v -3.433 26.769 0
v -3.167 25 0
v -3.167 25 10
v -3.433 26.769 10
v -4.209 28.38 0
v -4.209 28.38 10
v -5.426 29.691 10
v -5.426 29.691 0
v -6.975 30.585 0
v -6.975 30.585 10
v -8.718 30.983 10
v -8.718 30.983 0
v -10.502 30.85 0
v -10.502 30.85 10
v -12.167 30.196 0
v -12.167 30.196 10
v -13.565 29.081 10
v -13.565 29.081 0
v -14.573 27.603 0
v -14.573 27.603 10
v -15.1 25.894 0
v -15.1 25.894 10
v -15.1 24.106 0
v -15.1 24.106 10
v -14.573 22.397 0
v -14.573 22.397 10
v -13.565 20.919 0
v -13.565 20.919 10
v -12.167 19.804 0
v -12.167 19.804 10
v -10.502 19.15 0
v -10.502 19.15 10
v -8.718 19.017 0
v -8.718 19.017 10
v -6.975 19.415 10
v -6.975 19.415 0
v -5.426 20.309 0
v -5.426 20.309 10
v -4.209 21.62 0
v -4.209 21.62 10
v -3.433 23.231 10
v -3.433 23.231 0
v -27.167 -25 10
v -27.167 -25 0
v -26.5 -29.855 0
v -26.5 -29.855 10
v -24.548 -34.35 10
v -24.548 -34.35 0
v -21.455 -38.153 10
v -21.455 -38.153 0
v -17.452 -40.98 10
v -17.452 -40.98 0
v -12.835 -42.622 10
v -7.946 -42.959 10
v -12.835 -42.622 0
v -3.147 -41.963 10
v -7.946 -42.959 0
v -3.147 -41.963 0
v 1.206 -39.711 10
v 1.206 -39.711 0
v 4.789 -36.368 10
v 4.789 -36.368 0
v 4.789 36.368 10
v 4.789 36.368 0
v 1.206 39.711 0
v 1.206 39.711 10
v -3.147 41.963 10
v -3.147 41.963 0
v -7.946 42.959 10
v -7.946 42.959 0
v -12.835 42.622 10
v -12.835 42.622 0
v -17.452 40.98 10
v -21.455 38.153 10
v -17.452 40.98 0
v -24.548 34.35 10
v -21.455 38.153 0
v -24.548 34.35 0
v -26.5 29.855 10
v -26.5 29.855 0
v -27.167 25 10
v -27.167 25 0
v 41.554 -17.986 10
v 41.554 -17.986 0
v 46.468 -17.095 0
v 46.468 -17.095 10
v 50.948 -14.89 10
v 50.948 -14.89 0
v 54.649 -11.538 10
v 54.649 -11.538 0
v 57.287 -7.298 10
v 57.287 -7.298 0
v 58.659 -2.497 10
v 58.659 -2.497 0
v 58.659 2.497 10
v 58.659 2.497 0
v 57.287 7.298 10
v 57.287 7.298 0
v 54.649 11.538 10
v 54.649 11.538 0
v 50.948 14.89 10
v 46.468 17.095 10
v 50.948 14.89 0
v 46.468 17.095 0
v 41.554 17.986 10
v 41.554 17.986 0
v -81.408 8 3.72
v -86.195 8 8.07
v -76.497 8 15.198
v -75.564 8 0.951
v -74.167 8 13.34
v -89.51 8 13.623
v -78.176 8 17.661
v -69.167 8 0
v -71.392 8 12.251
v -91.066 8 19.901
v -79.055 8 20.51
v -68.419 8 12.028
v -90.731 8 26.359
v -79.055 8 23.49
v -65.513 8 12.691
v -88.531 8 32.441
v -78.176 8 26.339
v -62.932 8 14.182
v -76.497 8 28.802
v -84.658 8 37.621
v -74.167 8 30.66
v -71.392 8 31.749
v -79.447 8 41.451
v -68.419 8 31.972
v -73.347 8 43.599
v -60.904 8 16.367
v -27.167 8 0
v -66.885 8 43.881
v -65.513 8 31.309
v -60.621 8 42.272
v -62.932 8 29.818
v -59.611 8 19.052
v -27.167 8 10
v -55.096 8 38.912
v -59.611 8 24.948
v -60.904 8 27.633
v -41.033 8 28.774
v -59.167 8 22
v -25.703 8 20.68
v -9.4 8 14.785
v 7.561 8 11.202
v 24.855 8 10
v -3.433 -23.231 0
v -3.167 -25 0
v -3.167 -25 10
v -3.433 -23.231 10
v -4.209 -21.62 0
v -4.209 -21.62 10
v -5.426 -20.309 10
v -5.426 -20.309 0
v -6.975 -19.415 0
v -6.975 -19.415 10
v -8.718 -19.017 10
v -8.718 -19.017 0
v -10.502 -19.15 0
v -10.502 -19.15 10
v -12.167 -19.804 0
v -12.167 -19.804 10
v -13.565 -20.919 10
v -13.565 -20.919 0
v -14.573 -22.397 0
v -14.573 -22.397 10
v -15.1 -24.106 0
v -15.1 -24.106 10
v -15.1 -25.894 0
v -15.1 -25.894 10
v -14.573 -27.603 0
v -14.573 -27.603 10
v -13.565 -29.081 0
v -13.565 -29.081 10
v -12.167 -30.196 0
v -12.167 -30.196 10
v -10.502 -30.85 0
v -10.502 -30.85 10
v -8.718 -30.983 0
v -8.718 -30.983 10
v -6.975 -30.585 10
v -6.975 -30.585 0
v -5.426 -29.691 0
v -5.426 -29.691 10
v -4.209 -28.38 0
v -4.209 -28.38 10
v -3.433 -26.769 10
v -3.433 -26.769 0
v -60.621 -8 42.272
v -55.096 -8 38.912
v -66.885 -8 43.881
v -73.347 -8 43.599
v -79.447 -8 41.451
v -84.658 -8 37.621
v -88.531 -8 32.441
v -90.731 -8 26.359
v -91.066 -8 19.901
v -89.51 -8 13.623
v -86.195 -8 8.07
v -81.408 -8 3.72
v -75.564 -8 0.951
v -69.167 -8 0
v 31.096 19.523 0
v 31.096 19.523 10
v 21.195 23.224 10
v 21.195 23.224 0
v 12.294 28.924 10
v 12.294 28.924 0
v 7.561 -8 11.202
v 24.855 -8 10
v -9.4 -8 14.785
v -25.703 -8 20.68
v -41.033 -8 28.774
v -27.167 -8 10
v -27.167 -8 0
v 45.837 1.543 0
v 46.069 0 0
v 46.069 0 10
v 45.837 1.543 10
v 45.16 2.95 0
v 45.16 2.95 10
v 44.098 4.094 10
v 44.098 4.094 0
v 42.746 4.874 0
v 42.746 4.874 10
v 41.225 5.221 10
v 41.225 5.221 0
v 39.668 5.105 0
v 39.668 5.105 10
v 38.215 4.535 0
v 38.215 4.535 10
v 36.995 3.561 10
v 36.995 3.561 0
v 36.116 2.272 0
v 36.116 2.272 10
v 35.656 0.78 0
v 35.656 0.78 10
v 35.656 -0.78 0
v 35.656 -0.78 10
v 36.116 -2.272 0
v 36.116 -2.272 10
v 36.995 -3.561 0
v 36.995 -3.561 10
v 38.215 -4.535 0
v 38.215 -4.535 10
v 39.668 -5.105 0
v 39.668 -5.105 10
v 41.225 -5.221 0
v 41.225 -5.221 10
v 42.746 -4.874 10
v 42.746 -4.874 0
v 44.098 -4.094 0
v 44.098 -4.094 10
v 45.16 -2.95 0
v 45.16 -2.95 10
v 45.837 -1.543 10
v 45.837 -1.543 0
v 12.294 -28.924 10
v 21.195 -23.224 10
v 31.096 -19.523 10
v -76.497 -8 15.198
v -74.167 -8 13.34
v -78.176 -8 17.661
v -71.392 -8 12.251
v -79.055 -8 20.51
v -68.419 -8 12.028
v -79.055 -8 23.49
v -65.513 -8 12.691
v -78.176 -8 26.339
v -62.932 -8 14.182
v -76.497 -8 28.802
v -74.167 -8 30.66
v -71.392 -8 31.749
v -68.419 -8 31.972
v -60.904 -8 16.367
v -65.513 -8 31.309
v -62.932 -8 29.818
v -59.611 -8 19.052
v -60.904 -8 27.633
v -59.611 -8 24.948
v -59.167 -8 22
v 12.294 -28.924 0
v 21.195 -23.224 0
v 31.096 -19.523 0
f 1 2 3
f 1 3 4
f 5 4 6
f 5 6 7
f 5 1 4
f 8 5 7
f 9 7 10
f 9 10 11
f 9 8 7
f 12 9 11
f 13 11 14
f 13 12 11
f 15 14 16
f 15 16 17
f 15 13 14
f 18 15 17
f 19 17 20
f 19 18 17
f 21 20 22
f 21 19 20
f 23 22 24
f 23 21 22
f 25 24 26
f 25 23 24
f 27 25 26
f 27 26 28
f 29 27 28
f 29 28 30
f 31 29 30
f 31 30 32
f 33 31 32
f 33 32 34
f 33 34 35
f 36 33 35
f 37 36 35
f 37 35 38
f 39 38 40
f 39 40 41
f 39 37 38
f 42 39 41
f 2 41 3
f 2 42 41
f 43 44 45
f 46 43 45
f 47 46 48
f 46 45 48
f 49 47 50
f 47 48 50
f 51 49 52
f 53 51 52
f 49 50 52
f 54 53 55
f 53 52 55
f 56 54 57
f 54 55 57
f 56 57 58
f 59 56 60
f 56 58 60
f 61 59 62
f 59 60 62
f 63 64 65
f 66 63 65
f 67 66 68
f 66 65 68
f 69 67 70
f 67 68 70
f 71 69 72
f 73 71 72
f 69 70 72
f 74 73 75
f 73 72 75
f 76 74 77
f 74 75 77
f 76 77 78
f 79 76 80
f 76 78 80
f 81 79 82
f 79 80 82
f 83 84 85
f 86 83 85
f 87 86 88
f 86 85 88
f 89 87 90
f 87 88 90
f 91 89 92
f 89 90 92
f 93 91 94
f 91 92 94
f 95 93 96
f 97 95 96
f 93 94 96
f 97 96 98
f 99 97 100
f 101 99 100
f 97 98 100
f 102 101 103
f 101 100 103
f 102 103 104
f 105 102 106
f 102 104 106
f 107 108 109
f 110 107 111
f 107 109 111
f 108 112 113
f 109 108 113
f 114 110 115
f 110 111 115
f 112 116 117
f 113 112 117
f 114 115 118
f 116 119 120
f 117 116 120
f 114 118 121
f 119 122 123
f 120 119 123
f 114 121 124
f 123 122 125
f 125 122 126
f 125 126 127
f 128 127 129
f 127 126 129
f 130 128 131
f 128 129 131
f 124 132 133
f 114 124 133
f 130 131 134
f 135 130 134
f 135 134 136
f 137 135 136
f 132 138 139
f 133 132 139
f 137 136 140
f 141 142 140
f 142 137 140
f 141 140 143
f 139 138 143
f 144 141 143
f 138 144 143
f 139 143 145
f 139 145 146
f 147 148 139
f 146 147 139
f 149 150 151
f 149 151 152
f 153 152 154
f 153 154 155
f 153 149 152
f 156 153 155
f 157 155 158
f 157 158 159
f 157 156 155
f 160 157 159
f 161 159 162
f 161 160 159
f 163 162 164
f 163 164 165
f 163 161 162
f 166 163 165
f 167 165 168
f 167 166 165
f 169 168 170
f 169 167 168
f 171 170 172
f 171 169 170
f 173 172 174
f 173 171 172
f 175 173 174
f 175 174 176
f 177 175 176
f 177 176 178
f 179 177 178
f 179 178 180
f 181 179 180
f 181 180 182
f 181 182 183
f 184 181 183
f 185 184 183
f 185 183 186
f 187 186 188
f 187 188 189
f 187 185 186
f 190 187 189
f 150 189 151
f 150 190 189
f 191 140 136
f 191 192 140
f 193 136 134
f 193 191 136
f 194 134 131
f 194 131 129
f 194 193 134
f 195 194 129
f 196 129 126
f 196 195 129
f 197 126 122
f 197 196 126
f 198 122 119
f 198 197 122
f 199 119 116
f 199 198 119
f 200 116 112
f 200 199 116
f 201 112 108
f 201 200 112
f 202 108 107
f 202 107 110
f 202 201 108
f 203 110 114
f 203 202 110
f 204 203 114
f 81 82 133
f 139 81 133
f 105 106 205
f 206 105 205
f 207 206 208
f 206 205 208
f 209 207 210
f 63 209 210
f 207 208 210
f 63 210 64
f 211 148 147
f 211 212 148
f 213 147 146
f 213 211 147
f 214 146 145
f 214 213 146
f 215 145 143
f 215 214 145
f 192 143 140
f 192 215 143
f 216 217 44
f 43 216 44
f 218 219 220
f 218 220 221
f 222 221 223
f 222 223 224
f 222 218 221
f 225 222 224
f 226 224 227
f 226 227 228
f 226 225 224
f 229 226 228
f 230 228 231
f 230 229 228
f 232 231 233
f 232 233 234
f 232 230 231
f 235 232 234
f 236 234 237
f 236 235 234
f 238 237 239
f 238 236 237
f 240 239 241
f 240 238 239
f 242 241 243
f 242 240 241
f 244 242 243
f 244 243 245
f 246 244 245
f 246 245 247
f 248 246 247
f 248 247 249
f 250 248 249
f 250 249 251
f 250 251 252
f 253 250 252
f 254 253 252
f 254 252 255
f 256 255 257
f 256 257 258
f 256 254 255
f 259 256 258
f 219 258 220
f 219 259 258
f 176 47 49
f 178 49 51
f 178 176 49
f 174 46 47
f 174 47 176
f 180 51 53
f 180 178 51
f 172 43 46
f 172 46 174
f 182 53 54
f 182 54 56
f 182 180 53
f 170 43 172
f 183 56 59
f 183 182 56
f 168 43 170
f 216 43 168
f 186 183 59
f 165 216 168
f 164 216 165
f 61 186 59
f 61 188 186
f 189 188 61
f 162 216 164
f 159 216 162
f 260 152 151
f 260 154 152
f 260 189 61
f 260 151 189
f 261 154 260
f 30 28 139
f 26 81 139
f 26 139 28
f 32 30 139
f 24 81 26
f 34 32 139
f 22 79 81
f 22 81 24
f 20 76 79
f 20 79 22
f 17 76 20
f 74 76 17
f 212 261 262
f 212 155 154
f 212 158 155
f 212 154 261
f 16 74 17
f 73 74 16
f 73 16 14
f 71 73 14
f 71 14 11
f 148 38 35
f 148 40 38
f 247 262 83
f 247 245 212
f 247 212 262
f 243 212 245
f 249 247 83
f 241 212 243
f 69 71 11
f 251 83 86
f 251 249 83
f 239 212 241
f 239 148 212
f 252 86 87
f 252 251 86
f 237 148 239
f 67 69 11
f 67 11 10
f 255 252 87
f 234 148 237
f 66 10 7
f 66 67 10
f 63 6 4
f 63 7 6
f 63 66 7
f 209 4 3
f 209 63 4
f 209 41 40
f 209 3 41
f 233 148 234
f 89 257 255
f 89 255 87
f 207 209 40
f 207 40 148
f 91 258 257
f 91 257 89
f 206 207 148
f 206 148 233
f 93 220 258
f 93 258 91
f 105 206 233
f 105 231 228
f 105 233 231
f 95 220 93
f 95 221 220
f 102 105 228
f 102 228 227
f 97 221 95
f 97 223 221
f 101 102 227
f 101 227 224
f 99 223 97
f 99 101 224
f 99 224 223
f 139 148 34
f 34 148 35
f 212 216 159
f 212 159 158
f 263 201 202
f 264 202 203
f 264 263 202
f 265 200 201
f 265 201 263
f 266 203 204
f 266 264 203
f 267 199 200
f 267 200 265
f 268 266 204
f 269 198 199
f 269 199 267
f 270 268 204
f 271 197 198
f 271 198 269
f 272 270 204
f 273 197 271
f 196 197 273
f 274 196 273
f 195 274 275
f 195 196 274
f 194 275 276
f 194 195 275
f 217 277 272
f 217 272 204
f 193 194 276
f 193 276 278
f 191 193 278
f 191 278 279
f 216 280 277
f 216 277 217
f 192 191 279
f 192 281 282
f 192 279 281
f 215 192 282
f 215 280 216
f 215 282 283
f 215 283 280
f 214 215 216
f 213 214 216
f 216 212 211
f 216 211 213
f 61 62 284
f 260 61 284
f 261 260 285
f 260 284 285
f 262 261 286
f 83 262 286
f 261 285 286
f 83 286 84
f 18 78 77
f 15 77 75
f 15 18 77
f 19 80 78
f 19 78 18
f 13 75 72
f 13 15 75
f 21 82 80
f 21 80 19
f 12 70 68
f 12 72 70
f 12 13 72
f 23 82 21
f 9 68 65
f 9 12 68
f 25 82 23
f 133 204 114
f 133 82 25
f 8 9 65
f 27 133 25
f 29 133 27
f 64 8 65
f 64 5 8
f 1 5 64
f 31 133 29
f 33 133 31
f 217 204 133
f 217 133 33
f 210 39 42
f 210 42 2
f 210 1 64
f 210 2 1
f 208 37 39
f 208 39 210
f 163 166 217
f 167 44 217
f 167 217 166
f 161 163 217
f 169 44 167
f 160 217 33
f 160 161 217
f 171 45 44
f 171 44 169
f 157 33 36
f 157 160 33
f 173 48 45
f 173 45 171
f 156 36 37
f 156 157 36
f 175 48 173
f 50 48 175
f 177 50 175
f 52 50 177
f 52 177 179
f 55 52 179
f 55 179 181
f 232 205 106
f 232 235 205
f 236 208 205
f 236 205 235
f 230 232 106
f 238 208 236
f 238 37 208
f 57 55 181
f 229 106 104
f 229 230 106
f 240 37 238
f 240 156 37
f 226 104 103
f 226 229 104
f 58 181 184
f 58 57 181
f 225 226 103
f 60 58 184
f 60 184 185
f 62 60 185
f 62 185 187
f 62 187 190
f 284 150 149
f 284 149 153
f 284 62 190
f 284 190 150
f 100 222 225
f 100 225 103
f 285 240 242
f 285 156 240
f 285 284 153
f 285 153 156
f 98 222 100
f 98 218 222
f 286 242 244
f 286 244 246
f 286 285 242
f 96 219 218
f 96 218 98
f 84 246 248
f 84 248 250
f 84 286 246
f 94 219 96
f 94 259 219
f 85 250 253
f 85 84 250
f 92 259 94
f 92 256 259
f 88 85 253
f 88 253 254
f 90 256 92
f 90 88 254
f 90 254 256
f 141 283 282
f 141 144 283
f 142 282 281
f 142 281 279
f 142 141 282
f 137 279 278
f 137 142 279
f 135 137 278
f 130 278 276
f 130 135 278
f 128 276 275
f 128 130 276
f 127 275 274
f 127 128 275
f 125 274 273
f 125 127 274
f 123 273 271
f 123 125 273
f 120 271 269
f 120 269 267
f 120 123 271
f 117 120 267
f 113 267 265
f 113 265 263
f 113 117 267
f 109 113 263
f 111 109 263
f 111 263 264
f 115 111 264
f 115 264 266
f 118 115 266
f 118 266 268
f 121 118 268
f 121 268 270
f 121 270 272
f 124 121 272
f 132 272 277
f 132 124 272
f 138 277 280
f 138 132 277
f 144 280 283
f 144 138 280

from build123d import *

# Parameters (mm, degrees)
F0_R     = 6
F0_R_2   = 5.236084
F1_DEPTH = 10
F2_R     = 10
F3_DEPTH = 8


with BuildPart() as f1:
    # F0 (on Top) → F1 (new body)
    with BuildSketch(Plane.XY):
        with BuildLine():
            ThreePointArc((4.789302, -36.367918), (21.195339, -23.224109), (41.554008, -17.985565))
            ThreePointArc((41.554008, -17.985565), (58.833284, 0), (41.554008, 17.985565))
            ThreePointArc((41.554008, 17.985565), (21.195339, 23.224109), (4.789302, 36.367918))
            ThreePointArc((4.789302, 36.367918), (-15.199612, 41.958896), (-27.166716, 25))
            Line((-27.166716, 25), (-27.166716, -25))
            ThreePointArc((-27.166716, -25), (-15.199612, -41.958896), (4.789302, -36.367918))
        make_face()
        with Locations((-9.166716, -25)):
            Circle(F0_R, mode=Mode.SUBTRACT)
        with Locations((-9.166716, 25)):
            Circle(F0_R, mode=Mode.SUBTRACT)
        with Locations((40.833284, 0)):
            Circle(F0_R_2, mode=Mode.SUBTRACT)
    extrude(amount=F1_DEPTH)

    # F2 (on Front) → F3 (join, symmetric)
    with BuildSketch(Plane.XZ):
        with BuildLine():
            ThreePointArc((-55.095504, 38.911565), (-89.855534, 29.481496), (-69.166716, 0))
            Line((-69.166716, 0), (-27.166716, 0))
            Line((-27.166716, 0), (0, 0))
            Line((0, 0), (24.854559, 0))
            Line((24.854559, 0), (24.854559, 10))
            ThreePointArc((24.854559, 10), (-17.653944, 17.449895), (-55.095504, 38.911565))
        make_face()
        with Locations((-69.166716, 22)):
            Circle(F2_R, mode=Mode.SUBTRACT)
    extrude(amount=F3_DEPTH, both=True)


solid = f1.part
